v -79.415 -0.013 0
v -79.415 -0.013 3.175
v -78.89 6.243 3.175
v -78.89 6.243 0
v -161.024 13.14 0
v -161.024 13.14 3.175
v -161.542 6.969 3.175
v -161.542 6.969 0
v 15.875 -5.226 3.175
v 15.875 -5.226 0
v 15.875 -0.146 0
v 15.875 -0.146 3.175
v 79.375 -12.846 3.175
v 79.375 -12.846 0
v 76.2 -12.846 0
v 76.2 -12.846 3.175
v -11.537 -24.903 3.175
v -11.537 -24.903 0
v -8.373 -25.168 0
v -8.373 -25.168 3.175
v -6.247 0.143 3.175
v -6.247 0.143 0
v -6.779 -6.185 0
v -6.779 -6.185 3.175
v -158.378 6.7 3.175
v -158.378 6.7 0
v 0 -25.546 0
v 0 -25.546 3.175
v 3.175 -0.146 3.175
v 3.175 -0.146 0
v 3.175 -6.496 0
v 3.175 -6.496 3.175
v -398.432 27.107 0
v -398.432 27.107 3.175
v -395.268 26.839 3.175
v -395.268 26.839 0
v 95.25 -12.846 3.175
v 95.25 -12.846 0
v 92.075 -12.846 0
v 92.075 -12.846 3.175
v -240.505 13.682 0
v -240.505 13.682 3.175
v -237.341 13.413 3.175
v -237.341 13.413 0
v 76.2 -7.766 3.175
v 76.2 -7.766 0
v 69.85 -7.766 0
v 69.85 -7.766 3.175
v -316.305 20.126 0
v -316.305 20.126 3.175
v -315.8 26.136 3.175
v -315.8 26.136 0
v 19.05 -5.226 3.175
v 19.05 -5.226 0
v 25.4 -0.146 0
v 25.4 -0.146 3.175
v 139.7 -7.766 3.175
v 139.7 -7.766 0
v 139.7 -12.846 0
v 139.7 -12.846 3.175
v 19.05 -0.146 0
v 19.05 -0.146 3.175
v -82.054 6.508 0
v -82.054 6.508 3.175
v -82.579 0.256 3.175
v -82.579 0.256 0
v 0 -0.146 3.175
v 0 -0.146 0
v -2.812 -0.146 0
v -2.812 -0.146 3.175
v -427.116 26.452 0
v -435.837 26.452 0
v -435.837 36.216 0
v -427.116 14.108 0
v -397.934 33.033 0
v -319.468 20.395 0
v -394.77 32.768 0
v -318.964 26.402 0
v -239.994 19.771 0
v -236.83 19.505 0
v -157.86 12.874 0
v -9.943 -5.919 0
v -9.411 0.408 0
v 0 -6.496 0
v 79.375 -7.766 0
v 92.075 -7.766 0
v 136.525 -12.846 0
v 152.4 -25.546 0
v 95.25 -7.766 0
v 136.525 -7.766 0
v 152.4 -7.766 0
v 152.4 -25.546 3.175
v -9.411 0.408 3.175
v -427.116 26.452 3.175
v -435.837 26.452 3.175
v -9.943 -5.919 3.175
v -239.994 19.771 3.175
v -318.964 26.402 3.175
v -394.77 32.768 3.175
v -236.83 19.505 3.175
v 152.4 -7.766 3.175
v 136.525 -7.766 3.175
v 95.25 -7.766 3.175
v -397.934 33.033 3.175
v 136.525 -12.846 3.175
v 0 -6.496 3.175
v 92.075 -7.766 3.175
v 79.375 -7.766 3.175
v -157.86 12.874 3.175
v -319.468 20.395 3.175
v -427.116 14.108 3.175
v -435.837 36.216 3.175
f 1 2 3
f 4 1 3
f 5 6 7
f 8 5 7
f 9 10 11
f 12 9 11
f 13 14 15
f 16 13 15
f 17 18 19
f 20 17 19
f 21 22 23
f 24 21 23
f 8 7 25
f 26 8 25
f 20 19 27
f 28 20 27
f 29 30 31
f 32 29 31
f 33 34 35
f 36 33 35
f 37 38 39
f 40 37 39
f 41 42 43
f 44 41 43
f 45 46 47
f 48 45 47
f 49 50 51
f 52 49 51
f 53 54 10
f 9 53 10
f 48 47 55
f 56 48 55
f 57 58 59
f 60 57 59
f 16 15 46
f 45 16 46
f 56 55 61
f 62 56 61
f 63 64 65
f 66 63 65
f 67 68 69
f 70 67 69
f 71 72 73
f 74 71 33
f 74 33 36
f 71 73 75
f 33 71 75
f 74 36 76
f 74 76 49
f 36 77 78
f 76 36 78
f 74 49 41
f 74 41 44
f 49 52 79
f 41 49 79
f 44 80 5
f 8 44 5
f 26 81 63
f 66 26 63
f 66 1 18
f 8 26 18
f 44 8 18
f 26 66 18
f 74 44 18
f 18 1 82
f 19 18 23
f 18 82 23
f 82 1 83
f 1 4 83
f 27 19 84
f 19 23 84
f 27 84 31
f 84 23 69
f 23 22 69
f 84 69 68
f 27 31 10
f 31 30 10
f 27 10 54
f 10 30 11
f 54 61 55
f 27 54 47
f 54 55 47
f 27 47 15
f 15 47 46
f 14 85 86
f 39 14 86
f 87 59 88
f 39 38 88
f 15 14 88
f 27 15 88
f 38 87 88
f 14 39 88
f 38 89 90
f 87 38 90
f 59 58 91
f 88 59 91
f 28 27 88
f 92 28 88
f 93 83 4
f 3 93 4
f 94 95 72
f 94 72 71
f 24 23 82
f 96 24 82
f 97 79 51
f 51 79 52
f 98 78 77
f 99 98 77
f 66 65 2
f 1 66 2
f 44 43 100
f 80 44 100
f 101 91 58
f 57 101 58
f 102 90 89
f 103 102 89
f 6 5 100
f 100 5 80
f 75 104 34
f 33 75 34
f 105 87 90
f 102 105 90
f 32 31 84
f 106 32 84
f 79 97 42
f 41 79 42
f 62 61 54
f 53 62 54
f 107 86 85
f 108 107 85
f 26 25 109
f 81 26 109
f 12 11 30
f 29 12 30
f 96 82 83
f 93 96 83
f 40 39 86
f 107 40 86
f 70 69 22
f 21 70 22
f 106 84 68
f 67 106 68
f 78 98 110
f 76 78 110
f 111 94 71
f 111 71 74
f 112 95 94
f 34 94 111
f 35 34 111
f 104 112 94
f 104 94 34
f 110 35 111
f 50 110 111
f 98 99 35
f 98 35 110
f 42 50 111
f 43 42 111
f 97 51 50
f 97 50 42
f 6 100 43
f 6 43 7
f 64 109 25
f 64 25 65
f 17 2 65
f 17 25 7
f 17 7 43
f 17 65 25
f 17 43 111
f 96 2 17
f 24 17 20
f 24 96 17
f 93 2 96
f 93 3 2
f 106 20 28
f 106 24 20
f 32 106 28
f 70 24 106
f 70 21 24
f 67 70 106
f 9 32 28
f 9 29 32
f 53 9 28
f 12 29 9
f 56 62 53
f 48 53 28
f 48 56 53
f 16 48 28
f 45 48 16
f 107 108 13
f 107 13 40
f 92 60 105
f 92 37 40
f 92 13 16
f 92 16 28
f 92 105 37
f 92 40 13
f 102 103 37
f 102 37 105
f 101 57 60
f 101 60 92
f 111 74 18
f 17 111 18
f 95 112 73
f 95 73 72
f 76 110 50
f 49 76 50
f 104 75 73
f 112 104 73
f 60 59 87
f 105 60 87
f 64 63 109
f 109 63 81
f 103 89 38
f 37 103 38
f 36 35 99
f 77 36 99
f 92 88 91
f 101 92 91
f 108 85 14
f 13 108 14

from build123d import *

# Parameters (mm, degrees)
BOSS_EXTRUDE1_DEPTH = 3.175
CUT_EXTRUDE1_DEPTH  = 4.175
CUT_EXTRUDE2_DEPTH  = 7.62


with BuildPart() as part:
    # Sketch1 → Boss-Extrude1 (new body)
    with BuildSketch(Plane.XY):
        Polygon((-950.530495659, 69.619322302), (-951.061849964, 63.291592645), (-11.536706102, -24.902638492), (-8.372841274, -25.168315645), (0, -25.545856054), (152.4, -25.545856054), (152.4, -7.765856054), (139.7, -7.765856054), (139.7, -12.845856054), (136.525, -12.845856054), (136.525, -7.765856054), (95.25, -7.765856054), (95.25, -12.845856054), (92.075, -12.845856054), (92.075, -7.765856054), (79.375, -7.765856054), (79.375, -12.845856054), (76.2, -12.845856054), (76.2, -7.765856054), (69.85, -7.765856054), (25.4, -0.145856054), (19.05, -0.145856054), (19.05, -5.225856054), (15.875, -5.225856054), (15.875, -0.145856054), (3.175, -0.145856054), (3.175, -6.495856054), (0, -6.495856054), (0, -0.145856054), (-2.81225704, -0.145856054), (-6.247424053, 0.14260298), (-6.778778359, -6.185126677), (-9.942643187, -5.919449524), (-9.411288881, 0.408280132), (-946.54805097, 79.101852726), (-947.366630831, 69.353645149), align=None)
    extrude(amount=BOSS_EXTRUDE1_DEPTH)

    # Sketch2 → Cut-Extrude1 (cut, through all)
    with BuildSketch(Plane.XY.offset(3.175)):
        Polygon((-869.047169109, 67.116306724), (-868.590421605, 72.555567687), (-871.754286433, 72.821244839), (-872.210759203, 67.385255598), align=None)
        Polygon((-790.083960364, 60.403342827), (-789.620355495, 65.924265958), (-792.784220323, 66.189943111), (-793.247550458, 60.672291701), align=None)
        Polygon((-711.120751618, 53.69037893), (-710.650289385, 59.29296423), (-713.814154213, 59.558641383), (-714.284341712, 53.959327804), align=None)
        Polygon((-632.157542872, 46.977415032), (-631.680223276, 52.661662502), (-634.844088104, 52.927339654), (-635.321132966, 47.246363906), align=None)
        Polygon((-553.194334126, 40.264451135), (-552.710157166, 46.030360773), (-555.874021994, 46.296037926), (-556.35792422, 40.533400009), align=None)
        Polygon((-474.23112538, 33.551487238), (-473.740091056, 39.399059045), (-476.903955884, 39.664736197), (-477.394715474, 33.820436112), align=None)
        Polygon((-395.267916634, 26.83852334), (-394.770024946, 32.767757316), (-397.933889774, 33.033434469), (-398.431506728, 27.107472214), align=None)
        Polygon((-316.304707888, 20.125559443), (-315.799958836, 26.136455588), (-318.963823664, 26.402132741), (-319.468297982, 20.394508317), align=None)
        Polygon((-237.341499142, 13.412595546), (-236.829892727, 19.50515386), (-239.993757555, 19.770831012), (-240.505089236, 13.68154442), align=None)
        Polygon((-158.378290396, 6.699631648), (-157.859826617, 12.873852131), (-161.023691445, 13.139529284), (-161.54188049, 6.968580522), align=None)
        Polygon((-79.415081651, -0.013332249), (-78.889760507, 6.242550403), (-82.053625335, 6.508227555), (-82.578671745, 0.255616625), align=None)
    extrude(amount=-CUT_EXTRUDE1_DEPTH, mode=Mode.SUBTRACT)

    # Sketch3 → Cut-Extrude2 (cut)
    with BuildSketch(Plane.XY.offset(3.175)):
        Polygon((-435.836990415, 36.216246757), (-435.836990415, 26.451619727), (-427.115588921, 26.451619727), (-427.115588921, 14.108196169), (-989.316849096, 0), (-981.213716068, 132.265755076), align=None)
    extrude(amount=-CUT_EXTRUDE2_DEPTH, mode=Mode.SUBTRACT)


solid = part.part
